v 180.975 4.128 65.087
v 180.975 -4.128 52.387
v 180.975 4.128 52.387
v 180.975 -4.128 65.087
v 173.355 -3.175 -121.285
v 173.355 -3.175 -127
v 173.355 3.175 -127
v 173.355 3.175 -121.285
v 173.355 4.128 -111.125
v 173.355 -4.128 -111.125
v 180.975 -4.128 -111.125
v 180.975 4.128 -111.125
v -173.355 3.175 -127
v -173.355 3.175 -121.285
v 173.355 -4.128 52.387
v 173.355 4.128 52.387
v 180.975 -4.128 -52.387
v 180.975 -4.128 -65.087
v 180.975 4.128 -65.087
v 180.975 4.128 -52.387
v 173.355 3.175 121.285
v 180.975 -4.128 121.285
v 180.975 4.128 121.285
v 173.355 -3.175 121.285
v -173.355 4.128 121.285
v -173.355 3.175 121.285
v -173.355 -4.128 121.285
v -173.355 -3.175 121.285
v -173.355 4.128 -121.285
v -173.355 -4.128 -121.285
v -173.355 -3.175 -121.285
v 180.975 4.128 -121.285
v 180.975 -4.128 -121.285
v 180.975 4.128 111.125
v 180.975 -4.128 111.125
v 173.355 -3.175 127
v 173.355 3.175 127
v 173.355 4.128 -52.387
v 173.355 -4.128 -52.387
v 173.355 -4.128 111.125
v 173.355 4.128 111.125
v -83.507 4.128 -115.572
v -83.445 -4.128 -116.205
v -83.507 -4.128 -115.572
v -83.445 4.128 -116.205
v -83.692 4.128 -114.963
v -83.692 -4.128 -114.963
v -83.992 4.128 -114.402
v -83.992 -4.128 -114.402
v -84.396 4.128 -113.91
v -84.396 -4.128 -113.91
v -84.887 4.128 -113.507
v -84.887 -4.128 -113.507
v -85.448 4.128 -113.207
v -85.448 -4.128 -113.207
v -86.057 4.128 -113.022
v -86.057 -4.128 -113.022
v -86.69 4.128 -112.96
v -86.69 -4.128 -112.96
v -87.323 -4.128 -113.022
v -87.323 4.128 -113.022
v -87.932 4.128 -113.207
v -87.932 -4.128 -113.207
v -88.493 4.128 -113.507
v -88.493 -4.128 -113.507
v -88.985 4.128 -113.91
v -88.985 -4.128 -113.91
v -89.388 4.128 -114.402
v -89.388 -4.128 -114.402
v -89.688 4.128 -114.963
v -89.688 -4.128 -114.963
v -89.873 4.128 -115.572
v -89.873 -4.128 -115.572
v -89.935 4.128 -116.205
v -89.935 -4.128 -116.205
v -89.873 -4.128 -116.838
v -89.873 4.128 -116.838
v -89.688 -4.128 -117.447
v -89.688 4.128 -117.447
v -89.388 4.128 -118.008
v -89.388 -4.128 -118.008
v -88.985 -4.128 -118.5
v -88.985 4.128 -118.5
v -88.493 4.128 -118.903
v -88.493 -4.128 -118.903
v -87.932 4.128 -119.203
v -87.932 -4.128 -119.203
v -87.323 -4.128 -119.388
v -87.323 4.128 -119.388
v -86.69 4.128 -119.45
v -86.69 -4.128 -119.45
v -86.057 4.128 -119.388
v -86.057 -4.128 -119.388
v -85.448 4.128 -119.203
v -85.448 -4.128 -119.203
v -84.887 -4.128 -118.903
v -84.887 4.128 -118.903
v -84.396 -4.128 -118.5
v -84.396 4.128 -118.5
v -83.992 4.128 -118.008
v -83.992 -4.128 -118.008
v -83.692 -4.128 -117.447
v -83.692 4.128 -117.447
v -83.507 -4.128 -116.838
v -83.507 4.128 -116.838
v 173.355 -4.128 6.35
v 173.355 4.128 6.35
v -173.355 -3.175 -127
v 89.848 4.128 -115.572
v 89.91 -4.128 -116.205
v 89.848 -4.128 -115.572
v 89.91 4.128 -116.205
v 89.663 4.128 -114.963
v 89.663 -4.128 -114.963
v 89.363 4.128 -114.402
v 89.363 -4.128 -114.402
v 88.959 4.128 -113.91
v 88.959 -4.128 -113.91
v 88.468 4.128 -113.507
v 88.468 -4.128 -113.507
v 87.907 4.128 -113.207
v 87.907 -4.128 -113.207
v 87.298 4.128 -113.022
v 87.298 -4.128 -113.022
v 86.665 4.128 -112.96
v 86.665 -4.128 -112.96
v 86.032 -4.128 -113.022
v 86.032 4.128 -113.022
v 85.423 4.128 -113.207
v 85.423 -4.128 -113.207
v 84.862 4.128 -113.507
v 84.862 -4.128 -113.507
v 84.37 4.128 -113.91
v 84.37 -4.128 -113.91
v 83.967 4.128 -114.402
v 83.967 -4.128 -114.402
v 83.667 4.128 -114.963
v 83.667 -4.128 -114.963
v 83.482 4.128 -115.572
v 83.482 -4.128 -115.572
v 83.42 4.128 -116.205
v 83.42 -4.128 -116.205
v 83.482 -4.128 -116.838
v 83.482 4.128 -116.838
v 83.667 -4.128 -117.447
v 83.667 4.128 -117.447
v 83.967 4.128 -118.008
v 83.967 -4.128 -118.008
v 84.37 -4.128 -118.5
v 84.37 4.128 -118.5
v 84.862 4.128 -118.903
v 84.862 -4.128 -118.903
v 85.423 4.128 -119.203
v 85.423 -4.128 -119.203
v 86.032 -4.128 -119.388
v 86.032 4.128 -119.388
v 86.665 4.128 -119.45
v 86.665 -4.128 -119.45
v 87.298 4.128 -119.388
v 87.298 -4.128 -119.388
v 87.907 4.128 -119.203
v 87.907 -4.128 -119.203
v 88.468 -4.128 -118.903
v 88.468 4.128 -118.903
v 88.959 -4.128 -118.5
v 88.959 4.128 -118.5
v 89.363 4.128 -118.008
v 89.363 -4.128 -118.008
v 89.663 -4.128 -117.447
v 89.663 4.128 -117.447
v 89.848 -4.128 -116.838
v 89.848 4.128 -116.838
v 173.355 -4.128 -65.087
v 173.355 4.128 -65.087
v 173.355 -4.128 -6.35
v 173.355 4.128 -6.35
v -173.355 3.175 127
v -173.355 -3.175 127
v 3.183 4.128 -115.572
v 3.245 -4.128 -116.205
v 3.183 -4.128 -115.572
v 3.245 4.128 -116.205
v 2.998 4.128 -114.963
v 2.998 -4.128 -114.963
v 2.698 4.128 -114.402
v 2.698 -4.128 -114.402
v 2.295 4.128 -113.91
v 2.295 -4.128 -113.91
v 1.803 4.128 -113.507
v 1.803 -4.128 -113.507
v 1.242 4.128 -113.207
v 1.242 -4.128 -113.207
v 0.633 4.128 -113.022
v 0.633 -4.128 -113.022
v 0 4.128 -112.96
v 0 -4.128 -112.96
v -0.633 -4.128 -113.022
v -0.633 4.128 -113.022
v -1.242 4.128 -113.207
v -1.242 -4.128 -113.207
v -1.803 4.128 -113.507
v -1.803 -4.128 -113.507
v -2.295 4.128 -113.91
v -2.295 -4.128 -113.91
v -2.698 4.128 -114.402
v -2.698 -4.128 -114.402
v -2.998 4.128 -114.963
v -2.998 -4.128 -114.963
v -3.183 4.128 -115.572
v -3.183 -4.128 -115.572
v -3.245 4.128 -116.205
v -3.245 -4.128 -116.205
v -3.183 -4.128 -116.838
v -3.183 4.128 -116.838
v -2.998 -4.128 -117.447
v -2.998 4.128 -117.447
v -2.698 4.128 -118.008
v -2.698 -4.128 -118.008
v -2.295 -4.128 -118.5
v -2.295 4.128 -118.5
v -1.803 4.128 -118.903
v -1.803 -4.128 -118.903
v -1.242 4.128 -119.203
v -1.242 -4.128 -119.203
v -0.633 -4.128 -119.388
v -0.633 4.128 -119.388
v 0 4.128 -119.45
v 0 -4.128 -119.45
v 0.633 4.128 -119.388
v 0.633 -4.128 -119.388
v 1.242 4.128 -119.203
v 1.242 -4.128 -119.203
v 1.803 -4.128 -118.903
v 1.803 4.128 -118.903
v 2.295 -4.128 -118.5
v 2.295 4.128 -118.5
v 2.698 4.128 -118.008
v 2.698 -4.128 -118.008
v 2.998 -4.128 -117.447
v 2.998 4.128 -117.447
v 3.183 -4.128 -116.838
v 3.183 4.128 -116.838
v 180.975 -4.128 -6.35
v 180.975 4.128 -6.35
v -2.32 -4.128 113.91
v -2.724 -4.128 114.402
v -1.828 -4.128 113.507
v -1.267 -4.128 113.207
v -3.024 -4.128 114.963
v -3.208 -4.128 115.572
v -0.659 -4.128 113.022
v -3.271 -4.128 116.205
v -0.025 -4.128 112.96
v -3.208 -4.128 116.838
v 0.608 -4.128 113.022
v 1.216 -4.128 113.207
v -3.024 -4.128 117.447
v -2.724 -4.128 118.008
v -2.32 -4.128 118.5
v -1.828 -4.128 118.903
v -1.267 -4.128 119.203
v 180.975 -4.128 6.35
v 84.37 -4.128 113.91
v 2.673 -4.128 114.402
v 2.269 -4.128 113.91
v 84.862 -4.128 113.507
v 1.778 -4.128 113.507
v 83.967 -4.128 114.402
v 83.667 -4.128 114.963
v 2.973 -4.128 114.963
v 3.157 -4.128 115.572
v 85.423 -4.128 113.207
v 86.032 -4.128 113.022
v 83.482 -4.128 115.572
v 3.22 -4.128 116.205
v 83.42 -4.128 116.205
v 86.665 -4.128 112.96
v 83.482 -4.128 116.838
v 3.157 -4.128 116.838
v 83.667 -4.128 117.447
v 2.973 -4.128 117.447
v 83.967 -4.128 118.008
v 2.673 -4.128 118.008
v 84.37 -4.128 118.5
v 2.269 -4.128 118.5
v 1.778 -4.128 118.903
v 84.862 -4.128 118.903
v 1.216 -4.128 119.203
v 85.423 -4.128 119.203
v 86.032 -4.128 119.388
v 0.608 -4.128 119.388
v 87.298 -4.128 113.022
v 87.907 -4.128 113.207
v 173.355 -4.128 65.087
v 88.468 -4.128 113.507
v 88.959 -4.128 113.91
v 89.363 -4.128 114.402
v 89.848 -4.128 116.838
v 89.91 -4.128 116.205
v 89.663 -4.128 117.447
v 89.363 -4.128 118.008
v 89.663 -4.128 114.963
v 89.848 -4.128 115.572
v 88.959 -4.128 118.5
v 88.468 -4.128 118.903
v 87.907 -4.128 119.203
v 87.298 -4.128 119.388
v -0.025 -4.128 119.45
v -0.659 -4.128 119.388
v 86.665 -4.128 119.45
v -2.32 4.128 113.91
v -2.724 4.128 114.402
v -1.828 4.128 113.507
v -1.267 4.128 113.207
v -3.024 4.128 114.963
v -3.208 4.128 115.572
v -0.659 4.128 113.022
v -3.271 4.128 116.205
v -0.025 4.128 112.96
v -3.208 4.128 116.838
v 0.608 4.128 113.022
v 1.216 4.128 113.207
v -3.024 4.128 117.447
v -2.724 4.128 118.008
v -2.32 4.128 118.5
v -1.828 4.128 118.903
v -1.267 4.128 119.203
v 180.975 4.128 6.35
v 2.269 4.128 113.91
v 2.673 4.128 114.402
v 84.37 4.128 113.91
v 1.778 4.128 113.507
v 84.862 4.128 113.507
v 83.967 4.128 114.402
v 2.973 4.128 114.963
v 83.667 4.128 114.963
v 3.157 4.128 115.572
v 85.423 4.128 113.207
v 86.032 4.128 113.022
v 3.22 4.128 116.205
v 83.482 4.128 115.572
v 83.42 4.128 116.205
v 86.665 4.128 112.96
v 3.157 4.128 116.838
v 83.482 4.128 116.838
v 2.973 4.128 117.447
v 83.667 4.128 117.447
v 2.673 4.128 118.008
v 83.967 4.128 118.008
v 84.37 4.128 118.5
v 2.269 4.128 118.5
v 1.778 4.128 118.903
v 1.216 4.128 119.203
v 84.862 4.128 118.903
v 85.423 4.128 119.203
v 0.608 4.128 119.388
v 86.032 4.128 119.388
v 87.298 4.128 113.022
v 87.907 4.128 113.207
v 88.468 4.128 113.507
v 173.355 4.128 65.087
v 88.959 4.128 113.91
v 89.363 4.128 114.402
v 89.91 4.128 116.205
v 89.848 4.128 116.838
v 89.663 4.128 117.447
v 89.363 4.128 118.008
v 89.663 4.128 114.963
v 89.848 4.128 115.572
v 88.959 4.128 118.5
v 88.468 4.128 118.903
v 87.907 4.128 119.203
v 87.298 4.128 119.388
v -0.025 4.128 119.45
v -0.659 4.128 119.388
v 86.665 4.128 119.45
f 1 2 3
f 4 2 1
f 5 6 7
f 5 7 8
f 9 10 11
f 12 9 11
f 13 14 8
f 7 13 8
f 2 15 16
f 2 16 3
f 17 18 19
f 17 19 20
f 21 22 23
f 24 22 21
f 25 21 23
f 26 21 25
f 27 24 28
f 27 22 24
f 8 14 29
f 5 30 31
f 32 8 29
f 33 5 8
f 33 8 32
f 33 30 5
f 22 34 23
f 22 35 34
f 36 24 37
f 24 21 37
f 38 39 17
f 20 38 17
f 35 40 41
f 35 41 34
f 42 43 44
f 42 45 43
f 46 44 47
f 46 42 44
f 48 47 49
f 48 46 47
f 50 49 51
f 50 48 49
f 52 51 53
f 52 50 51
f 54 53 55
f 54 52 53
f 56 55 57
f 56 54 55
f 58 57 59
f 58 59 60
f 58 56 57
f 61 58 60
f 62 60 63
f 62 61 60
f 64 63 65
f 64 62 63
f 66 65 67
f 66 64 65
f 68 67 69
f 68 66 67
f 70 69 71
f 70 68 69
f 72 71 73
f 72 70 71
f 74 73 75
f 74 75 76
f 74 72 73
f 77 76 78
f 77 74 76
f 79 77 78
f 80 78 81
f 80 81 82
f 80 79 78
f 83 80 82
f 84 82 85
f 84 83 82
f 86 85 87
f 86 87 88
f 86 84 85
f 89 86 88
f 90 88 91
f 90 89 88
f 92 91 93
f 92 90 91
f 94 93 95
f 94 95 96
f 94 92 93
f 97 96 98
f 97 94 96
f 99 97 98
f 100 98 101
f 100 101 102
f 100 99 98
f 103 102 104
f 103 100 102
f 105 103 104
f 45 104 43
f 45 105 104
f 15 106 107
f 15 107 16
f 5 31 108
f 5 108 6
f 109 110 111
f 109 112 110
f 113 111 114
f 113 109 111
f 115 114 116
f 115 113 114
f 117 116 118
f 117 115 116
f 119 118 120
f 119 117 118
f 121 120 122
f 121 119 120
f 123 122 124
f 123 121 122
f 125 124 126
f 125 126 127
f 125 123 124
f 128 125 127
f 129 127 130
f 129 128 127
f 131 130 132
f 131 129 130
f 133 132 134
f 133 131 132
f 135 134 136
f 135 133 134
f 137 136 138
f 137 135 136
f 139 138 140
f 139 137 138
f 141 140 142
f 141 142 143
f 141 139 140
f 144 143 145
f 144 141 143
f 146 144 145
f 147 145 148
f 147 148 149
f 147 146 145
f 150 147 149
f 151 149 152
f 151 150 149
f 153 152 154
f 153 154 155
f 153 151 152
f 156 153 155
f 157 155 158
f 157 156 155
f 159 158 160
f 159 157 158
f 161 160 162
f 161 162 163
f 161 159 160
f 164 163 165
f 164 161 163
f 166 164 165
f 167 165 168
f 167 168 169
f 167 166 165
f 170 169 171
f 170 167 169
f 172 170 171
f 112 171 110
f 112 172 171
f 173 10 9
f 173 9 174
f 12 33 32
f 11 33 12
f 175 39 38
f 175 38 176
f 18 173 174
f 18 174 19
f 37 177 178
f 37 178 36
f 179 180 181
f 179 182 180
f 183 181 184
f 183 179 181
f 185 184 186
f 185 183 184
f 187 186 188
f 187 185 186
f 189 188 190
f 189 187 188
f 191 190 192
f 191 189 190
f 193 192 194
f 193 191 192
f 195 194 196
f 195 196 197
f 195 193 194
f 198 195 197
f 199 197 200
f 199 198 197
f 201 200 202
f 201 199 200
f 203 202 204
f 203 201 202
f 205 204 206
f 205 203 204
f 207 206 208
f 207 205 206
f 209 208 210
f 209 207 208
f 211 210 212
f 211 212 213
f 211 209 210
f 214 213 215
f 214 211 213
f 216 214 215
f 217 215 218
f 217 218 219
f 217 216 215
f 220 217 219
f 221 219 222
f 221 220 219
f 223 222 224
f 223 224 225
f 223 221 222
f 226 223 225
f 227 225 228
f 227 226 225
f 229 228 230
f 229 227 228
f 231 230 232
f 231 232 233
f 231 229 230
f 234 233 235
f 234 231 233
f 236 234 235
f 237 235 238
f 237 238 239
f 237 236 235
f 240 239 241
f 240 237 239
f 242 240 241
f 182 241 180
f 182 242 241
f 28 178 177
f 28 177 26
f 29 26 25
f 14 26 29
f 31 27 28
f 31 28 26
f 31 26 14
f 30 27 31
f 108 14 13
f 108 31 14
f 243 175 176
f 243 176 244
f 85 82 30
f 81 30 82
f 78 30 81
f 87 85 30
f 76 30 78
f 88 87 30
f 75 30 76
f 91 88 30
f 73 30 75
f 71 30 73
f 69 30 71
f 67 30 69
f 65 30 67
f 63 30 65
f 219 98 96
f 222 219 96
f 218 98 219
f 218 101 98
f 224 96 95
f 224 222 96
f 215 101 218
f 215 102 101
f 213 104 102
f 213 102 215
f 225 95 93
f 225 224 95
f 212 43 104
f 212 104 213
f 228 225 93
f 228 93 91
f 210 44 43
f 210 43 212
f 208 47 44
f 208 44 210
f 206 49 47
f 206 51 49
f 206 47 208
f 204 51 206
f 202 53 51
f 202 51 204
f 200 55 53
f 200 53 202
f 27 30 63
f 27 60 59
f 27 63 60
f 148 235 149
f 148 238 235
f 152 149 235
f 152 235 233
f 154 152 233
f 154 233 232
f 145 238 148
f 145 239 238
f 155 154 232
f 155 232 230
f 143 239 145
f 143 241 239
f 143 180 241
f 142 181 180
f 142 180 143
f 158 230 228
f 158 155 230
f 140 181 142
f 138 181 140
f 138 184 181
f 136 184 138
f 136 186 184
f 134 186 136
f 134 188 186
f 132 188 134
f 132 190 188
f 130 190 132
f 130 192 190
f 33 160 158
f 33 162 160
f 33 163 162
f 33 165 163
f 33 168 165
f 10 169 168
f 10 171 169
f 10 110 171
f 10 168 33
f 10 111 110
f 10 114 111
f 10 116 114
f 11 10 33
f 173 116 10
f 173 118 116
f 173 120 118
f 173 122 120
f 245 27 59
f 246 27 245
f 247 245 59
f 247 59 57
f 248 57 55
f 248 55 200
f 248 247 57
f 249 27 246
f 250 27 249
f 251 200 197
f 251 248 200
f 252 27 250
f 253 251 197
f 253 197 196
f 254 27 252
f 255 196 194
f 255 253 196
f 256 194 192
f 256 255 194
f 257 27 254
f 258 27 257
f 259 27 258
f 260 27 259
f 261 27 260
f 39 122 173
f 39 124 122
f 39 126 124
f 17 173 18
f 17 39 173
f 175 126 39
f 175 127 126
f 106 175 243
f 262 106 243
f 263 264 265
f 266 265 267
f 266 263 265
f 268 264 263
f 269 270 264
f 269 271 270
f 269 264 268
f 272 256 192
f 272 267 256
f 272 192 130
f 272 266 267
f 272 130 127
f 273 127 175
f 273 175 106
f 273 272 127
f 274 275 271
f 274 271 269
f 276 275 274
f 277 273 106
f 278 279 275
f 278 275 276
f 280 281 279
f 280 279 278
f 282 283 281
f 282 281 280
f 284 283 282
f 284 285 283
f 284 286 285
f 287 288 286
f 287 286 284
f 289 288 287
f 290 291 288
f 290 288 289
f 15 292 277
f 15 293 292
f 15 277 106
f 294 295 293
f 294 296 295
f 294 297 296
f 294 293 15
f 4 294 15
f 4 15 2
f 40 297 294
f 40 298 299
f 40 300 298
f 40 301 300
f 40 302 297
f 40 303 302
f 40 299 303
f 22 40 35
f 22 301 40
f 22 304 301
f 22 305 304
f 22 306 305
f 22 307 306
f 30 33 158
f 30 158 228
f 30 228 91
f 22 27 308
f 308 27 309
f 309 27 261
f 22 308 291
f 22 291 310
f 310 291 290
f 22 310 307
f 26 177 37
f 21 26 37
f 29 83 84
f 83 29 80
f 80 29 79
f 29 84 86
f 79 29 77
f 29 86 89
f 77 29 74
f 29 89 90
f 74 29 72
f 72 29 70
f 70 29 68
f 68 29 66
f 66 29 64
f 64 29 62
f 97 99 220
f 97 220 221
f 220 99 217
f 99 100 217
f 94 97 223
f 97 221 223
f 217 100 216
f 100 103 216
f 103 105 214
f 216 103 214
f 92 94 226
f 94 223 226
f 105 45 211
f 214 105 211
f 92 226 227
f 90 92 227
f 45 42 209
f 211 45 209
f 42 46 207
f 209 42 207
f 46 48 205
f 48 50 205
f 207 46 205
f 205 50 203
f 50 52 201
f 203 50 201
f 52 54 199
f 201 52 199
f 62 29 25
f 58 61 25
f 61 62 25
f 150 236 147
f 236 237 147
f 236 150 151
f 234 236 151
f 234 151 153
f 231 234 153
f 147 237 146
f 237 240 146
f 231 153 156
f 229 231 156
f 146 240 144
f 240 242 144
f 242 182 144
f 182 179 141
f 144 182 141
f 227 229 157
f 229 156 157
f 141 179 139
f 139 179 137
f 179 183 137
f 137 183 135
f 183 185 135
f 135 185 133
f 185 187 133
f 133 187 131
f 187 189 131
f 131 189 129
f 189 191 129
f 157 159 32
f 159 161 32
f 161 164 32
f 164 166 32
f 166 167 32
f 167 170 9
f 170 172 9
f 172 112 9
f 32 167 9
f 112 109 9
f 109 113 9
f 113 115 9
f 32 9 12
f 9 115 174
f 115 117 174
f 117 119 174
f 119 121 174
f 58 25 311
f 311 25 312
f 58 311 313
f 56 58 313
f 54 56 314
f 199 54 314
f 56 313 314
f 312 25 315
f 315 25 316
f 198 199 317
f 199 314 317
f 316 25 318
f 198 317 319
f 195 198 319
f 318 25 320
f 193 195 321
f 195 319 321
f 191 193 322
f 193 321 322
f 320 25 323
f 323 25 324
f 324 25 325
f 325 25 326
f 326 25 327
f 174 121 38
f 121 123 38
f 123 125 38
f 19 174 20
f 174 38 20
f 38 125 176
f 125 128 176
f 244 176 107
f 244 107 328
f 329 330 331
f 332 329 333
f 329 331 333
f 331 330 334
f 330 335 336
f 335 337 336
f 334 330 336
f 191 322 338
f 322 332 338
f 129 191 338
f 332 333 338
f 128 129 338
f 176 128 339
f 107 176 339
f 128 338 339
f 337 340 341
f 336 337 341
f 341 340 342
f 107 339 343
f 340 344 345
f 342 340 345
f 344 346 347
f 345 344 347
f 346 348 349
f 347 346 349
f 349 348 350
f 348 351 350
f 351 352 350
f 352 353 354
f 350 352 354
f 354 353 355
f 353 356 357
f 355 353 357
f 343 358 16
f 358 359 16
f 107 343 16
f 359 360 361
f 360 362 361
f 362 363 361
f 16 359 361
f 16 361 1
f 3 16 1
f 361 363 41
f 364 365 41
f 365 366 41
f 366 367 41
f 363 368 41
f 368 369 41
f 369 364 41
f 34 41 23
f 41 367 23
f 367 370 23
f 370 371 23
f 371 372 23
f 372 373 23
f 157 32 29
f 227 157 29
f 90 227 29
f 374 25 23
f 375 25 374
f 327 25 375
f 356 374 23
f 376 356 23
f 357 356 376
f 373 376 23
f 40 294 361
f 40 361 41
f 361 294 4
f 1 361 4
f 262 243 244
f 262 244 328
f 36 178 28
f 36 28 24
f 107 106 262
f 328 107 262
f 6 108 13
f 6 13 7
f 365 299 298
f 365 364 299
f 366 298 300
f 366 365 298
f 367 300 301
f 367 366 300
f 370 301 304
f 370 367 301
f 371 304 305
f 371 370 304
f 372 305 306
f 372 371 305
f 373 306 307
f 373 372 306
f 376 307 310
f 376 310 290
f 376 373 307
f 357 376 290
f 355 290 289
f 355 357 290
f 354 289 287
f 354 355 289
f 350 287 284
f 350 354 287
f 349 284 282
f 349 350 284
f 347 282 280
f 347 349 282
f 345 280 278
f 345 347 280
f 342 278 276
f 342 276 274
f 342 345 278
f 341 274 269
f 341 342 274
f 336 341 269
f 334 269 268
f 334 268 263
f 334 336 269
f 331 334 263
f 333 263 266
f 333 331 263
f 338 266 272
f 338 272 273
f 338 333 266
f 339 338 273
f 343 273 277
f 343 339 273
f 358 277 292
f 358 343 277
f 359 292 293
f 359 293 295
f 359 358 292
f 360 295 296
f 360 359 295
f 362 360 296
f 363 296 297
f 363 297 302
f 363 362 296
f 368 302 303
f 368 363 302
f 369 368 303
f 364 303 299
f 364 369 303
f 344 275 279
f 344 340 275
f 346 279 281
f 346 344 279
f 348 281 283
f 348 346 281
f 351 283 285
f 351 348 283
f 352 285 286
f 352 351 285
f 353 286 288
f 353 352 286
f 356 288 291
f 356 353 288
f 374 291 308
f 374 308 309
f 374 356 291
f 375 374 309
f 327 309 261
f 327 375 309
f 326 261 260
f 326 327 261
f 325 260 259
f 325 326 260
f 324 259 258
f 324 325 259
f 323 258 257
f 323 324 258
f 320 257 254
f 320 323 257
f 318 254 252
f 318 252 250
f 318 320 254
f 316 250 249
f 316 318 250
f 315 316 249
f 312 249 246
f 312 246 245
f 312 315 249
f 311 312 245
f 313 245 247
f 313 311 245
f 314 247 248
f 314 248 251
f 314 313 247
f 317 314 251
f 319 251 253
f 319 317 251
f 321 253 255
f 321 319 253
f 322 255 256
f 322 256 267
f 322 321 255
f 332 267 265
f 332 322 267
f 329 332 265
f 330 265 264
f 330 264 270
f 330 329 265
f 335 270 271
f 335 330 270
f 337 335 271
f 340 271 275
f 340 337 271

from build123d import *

# Parameters (mm, degrees)
F0_R     = 3.245174
F0_W     = 7.62
F0_H     = 10.16
F0_H_2   = 12.7
F1_DEPTH = 4.1275
F0_W_2   = 346.71
F0_H_3   = 5.715
F2_DEPTH = 3.175


with BuildPart() as f1:
    # F0 (on Front) → F1 (new body, symmetric)
    with BuildSketch(Plane.XZ):
        Polygon((173.355, 121.285), (-173.355, 121.285), (-173.355, -121.285), (173.355, -121.285), (173.355, -111.125), (173.355, -65.0875), (173.355, -52.3875), (173.355, -6.35), (173.355, 6.35), (173.355, 52.3875), (173.355, 65.0875), (173.355, 111.125), align=None)
        with Locations((-86.6902, -116.205)):
            Circle(F0_R, mode=Mode.SUBTRACT)
        with Locations((0, -116.205)):
            Circle(F0_R, mode=Mode.SUBTRACT)
        with Locations((86.6648, -116.205)):
            Circle(F0_R, mode=Mode.SUBTRACT)
        with Locations((-0.0254, 116.205)):
            Circle(F0_R, mode=Mode.SUBTRACT)
        with Locations((86.6648, 116.205)):
            Circle(F0_R, mode=Mode.SUBTRACT)
        with Locations((177.165, 116.205)):
            Rectangle(F0_W, F0_H)
        with Locations((177.165, 58.7375)):
            Rectangle(F0_W, F0_H_2)
        with Locations((177.165, 0)):
            Rectangle(F0_W, F0_H_2)
        with Locations((177.165, -58.7375)):
            Rectangle(F0_W, F0_H_2)
        with Locations((177.165, -116.205)):
            Rectangle(F0_W, F0_H)
    extrude(amount=F1_DEPTH, both=True)

    # F0 (on Front) → F2 (join, symmetric)
    with BuildSketch(Plane.XZ):
        with Locations((0, 124.1425)):
            Rectangle(F0_W_2, F0_H_3)
        with Locations((0, -124.1425)):
            Rectangle(F0_W_2, F0_H_3)
    extrude(amount=F2_DEPTH, both=True)


solid = f1.part
